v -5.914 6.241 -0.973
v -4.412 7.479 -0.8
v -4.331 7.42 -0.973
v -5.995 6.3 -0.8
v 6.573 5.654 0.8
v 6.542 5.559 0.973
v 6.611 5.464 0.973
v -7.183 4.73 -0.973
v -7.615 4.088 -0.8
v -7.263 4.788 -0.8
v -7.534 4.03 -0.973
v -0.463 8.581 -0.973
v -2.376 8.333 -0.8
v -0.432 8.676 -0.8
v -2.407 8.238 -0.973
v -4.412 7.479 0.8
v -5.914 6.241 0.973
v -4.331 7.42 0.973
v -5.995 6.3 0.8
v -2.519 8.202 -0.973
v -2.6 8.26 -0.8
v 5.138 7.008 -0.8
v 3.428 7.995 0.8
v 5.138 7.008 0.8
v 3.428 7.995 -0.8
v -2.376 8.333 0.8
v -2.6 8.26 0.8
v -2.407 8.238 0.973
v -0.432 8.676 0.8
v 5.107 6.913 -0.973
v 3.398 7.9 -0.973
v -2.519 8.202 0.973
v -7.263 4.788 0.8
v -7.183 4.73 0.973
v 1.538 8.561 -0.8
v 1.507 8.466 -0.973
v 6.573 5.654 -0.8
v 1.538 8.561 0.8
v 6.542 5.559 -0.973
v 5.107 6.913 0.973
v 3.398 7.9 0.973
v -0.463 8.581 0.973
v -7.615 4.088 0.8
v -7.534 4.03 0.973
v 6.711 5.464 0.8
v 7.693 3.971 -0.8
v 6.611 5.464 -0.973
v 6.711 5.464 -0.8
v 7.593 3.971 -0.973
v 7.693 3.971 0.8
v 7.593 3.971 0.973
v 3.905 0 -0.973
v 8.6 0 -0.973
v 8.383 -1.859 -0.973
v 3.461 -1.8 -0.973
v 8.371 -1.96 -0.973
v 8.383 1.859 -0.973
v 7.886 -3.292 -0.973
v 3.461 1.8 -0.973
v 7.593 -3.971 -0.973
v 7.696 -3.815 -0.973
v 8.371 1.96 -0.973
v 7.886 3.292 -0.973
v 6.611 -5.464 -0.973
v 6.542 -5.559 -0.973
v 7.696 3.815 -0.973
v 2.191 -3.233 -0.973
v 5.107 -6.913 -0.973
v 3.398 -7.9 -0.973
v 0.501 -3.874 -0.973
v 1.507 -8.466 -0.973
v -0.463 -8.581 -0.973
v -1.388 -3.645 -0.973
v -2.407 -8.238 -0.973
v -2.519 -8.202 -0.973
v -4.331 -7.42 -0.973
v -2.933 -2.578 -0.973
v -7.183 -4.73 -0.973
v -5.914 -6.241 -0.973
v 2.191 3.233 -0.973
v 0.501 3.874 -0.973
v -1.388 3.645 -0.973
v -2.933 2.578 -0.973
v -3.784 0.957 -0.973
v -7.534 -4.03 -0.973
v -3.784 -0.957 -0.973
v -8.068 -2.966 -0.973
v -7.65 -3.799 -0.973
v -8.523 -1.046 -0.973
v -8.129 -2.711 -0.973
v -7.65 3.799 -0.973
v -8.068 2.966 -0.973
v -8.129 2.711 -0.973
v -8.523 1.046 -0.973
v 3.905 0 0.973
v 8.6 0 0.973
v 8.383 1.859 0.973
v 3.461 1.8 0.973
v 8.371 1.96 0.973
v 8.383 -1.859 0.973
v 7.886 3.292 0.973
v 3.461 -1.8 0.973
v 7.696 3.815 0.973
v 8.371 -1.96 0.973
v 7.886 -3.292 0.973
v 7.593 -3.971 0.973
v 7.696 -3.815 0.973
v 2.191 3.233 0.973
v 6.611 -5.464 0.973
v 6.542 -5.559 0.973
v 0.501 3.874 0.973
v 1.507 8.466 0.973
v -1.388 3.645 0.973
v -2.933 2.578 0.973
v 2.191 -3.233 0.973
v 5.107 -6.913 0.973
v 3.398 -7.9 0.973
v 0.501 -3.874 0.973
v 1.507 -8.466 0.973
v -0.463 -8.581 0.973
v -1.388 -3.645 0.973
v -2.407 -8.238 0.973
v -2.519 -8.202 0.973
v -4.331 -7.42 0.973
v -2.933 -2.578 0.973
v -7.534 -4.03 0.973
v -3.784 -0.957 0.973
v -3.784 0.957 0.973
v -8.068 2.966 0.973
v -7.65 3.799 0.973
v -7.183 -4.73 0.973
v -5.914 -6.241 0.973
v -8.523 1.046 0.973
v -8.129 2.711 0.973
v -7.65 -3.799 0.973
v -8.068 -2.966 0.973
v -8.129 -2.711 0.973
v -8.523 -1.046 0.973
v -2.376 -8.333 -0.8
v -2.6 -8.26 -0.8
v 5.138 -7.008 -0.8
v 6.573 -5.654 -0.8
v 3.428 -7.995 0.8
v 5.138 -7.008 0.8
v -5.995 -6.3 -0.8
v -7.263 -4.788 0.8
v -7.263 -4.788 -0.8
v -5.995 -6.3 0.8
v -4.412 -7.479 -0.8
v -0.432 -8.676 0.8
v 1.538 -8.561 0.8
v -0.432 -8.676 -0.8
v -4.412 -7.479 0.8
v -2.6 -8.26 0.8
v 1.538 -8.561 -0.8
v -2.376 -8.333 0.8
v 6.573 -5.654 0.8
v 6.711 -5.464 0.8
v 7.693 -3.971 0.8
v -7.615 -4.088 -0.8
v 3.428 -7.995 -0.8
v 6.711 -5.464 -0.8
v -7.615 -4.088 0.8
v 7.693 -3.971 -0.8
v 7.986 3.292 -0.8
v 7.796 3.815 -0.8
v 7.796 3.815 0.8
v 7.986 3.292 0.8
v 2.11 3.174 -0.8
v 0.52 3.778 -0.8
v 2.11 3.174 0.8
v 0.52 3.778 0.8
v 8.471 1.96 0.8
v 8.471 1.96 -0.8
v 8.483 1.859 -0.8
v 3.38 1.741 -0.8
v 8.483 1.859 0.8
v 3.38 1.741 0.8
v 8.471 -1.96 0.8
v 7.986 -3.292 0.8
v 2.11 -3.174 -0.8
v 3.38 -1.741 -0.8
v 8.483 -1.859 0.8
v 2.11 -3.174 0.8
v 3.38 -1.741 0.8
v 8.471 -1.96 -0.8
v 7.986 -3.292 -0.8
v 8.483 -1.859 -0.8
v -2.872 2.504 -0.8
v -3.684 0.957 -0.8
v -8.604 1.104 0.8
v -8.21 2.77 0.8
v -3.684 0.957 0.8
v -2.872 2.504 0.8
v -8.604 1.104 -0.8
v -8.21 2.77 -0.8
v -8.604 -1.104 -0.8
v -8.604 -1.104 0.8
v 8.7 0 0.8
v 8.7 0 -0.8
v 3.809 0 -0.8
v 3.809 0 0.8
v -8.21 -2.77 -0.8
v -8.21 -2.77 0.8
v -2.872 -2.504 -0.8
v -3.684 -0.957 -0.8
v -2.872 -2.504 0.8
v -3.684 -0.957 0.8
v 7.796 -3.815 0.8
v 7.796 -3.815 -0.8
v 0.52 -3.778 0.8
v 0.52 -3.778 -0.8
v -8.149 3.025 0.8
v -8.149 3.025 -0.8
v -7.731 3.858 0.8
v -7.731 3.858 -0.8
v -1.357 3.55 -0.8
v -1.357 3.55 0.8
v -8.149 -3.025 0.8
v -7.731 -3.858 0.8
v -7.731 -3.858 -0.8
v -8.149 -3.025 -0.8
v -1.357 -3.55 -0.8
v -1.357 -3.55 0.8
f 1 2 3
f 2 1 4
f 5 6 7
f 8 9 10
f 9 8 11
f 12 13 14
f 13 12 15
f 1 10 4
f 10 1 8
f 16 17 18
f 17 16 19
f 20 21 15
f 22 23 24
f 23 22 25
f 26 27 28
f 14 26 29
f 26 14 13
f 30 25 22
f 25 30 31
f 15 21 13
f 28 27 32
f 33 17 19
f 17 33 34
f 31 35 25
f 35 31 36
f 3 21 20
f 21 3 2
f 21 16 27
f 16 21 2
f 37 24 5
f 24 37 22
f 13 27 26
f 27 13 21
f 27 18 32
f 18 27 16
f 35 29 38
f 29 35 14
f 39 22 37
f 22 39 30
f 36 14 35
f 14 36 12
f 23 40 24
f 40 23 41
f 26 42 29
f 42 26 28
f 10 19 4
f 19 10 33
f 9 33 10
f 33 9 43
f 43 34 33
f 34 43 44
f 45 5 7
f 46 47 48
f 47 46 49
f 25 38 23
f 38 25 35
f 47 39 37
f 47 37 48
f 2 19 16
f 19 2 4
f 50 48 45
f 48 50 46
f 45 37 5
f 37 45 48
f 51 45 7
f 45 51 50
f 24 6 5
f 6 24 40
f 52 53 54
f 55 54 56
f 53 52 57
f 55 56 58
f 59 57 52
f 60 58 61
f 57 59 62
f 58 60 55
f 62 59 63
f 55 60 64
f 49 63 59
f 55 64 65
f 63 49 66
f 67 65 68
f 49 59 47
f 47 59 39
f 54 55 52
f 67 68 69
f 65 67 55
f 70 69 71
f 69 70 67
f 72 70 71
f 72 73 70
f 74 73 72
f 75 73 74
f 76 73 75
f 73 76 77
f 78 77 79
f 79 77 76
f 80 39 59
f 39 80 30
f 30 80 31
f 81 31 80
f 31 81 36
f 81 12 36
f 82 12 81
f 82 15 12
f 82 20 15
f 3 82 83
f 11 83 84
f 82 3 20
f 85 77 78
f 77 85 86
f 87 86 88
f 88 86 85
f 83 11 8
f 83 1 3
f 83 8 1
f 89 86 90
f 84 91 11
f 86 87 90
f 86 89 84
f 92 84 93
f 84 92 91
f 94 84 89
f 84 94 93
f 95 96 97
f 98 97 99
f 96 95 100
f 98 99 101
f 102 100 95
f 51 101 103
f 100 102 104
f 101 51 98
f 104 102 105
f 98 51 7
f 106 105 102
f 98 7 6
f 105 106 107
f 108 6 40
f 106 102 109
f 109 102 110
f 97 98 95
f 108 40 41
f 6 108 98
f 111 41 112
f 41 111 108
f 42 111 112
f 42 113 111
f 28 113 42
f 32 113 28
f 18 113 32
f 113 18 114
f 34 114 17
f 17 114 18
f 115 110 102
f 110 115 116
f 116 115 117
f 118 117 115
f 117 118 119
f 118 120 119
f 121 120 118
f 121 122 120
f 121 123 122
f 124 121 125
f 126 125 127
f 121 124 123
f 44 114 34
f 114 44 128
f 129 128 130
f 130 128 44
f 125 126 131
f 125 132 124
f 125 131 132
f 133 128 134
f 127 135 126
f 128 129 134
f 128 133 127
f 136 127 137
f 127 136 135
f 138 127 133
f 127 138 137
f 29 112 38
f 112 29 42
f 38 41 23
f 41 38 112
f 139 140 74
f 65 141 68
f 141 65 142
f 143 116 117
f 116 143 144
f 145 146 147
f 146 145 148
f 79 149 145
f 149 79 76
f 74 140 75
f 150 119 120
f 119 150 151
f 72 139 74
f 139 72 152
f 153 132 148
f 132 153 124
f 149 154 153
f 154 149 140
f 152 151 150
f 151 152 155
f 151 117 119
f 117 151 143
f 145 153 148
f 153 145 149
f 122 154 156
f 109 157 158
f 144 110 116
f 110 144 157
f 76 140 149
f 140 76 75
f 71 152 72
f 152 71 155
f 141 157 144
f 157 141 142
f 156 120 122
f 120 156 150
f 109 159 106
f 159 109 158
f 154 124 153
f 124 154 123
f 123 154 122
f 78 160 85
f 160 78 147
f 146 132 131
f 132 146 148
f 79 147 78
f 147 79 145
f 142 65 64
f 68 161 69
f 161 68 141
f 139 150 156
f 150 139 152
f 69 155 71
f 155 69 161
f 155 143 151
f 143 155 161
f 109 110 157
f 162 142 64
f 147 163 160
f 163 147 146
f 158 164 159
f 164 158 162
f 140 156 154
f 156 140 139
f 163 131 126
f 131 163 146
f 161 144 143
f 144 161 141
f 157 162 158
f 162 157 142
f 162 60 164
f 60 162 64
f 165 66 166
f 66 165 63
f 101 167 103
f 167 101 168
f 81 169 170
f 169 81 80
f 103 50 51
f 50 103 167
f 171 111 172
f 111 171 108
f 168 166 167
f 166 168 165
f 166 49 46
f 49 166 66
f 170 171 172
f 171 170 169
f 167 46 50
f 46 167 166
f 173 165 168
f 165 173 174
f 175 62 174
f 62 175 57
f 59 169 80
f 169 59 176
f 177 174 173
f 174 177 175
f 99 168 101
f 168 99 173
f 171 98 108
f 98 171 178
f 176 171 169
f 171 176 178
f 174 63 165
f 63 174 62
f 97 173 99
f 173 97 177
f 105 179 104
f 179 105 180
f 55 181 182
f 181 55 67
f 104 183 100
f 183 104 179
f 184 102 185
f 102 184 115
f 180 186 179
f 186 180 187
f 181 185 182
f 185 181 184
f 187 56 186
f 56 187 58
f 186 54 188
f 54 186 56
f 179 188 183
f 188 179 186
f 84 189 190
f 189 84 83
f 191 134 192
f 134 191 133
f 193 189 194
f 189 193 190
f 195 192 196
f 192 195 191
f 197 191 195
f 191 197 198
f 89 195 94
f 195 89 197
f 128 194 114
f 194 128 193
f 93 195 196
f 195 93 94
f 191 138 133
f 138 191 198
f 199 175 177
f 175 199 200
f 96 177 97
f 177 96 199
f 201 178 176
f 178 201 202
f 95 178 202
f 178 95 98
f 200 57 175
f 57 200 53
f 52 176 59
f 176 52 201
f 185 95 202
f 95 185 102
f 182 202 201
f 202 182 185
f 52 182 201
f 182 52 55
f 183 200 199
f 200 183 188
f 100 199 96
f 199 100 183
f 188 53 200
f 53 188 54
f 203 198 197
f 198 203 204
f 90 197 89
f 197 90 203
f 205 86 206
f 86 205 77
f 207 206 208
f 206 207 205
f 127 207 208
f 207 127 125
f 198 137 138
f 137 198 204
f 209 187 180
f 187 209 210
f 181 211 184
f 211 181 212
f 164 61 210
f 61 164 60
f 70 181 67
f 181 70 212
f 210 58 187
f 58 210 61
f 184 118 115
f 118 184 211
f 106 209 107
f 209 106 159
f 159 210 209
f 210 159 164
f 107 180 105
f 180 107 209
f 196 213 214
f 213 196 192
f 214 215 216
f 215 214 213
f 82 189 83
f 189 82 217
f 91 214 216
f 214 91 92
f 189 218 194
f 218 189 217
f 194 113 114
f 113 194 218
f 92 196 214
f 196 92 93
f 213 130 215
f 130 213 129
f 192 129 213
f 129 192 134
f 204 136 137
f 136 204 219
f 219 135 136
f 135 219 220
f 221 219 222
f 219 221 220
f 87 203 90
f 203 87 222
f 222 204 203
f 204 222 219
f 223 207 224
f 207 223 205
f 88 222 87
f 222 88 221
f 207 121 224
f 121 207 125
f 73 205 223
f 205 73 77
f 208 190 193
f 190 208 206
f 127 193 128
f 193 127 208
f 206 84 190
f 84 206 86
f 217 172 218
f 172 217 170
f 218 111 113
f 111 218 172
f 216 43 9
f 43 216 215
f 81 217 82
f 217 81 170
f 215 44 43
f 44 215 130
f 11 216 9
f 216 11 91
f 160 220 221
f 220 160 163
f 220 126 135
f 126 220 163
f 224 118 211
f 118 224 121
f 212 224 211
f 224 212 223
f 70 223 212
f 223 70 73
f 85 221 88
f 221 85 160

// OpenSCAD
// Parameters
id = 8.0; //[4.0:16.0:0.1]
od = 17.0; //[8.5:34.0:0.1]
thickness = 1.6; //[0.8:3.2:0.1]
overlap = 0.8; //[0.5:2.0:0.1]
chamfer_size = 0.3; //[0.1:0.8:0.05]
fillet_radius = 0.2; //[0.1:0.6:0.05]

// Base Shapes
module washer_outer_cyl() {
  cylinder(r=od/2, h=thickness, center=true);
}

module washer_inner_hole_cyl() {
  cylinder(r=id/2, h=thickness + 2*overlap, center=true);
}

module chamfer_outer_top_cone() {
  translate([0, 0, thickness/2 - chamfer_size/2 + overlap/2])
    cylinder(r1=od/2, r2=0, h=chamfer_size, center=true);
}

module chamfer_outer_bottom_cone() {
  translate([0, 0, -thickness/2 + chamfer_size/2 - overlap/2])
    rotate([180, 0, 0])
    cylinder(r1=od/2, r2=0, h=chamfer_size, center=true);
}

module chamfer_inner_top_cone() {
  translate([0, 0, thickness/2 - chamfer_size/2 + overlap/2])
    rotate([180, 0, 0])
    cylinder(r1=id/2 + chamfer_size, r2=0, h=chamfer_size, center=true);
}

module chamfer_inner_bottom_cone() {
  translate([0, 0, -thickness/2 + chamfer_size/2 - overlap/2])
    cylinder(r1=id/2 + chamfer_size, r2=0, h=chamfer_size, center=true);
}

module fillet_sphere() {
  sphere(r=fillet_radius, center=true);
}

// Operations
module washer_body() {
  difference() {
    washer_outer_cyl();
    washer_inner_hole_cyl();
  }
}

module edge_chamfers() {
  difference() {
    washer_body();
    chamfer_outer_top_cone();
    chamfer_outer_bottom_cone();
    chamfer_inner_top_cone();
    chamfer_inner_bottom_cone();
  }
}

// Final Output
module edge_fillets() {
  minkowski() {
    edge_chamfers();
    fillet_sphere();
  }
}

// Render the final washer with edge fillets
color("Silver") edge_fillets();
